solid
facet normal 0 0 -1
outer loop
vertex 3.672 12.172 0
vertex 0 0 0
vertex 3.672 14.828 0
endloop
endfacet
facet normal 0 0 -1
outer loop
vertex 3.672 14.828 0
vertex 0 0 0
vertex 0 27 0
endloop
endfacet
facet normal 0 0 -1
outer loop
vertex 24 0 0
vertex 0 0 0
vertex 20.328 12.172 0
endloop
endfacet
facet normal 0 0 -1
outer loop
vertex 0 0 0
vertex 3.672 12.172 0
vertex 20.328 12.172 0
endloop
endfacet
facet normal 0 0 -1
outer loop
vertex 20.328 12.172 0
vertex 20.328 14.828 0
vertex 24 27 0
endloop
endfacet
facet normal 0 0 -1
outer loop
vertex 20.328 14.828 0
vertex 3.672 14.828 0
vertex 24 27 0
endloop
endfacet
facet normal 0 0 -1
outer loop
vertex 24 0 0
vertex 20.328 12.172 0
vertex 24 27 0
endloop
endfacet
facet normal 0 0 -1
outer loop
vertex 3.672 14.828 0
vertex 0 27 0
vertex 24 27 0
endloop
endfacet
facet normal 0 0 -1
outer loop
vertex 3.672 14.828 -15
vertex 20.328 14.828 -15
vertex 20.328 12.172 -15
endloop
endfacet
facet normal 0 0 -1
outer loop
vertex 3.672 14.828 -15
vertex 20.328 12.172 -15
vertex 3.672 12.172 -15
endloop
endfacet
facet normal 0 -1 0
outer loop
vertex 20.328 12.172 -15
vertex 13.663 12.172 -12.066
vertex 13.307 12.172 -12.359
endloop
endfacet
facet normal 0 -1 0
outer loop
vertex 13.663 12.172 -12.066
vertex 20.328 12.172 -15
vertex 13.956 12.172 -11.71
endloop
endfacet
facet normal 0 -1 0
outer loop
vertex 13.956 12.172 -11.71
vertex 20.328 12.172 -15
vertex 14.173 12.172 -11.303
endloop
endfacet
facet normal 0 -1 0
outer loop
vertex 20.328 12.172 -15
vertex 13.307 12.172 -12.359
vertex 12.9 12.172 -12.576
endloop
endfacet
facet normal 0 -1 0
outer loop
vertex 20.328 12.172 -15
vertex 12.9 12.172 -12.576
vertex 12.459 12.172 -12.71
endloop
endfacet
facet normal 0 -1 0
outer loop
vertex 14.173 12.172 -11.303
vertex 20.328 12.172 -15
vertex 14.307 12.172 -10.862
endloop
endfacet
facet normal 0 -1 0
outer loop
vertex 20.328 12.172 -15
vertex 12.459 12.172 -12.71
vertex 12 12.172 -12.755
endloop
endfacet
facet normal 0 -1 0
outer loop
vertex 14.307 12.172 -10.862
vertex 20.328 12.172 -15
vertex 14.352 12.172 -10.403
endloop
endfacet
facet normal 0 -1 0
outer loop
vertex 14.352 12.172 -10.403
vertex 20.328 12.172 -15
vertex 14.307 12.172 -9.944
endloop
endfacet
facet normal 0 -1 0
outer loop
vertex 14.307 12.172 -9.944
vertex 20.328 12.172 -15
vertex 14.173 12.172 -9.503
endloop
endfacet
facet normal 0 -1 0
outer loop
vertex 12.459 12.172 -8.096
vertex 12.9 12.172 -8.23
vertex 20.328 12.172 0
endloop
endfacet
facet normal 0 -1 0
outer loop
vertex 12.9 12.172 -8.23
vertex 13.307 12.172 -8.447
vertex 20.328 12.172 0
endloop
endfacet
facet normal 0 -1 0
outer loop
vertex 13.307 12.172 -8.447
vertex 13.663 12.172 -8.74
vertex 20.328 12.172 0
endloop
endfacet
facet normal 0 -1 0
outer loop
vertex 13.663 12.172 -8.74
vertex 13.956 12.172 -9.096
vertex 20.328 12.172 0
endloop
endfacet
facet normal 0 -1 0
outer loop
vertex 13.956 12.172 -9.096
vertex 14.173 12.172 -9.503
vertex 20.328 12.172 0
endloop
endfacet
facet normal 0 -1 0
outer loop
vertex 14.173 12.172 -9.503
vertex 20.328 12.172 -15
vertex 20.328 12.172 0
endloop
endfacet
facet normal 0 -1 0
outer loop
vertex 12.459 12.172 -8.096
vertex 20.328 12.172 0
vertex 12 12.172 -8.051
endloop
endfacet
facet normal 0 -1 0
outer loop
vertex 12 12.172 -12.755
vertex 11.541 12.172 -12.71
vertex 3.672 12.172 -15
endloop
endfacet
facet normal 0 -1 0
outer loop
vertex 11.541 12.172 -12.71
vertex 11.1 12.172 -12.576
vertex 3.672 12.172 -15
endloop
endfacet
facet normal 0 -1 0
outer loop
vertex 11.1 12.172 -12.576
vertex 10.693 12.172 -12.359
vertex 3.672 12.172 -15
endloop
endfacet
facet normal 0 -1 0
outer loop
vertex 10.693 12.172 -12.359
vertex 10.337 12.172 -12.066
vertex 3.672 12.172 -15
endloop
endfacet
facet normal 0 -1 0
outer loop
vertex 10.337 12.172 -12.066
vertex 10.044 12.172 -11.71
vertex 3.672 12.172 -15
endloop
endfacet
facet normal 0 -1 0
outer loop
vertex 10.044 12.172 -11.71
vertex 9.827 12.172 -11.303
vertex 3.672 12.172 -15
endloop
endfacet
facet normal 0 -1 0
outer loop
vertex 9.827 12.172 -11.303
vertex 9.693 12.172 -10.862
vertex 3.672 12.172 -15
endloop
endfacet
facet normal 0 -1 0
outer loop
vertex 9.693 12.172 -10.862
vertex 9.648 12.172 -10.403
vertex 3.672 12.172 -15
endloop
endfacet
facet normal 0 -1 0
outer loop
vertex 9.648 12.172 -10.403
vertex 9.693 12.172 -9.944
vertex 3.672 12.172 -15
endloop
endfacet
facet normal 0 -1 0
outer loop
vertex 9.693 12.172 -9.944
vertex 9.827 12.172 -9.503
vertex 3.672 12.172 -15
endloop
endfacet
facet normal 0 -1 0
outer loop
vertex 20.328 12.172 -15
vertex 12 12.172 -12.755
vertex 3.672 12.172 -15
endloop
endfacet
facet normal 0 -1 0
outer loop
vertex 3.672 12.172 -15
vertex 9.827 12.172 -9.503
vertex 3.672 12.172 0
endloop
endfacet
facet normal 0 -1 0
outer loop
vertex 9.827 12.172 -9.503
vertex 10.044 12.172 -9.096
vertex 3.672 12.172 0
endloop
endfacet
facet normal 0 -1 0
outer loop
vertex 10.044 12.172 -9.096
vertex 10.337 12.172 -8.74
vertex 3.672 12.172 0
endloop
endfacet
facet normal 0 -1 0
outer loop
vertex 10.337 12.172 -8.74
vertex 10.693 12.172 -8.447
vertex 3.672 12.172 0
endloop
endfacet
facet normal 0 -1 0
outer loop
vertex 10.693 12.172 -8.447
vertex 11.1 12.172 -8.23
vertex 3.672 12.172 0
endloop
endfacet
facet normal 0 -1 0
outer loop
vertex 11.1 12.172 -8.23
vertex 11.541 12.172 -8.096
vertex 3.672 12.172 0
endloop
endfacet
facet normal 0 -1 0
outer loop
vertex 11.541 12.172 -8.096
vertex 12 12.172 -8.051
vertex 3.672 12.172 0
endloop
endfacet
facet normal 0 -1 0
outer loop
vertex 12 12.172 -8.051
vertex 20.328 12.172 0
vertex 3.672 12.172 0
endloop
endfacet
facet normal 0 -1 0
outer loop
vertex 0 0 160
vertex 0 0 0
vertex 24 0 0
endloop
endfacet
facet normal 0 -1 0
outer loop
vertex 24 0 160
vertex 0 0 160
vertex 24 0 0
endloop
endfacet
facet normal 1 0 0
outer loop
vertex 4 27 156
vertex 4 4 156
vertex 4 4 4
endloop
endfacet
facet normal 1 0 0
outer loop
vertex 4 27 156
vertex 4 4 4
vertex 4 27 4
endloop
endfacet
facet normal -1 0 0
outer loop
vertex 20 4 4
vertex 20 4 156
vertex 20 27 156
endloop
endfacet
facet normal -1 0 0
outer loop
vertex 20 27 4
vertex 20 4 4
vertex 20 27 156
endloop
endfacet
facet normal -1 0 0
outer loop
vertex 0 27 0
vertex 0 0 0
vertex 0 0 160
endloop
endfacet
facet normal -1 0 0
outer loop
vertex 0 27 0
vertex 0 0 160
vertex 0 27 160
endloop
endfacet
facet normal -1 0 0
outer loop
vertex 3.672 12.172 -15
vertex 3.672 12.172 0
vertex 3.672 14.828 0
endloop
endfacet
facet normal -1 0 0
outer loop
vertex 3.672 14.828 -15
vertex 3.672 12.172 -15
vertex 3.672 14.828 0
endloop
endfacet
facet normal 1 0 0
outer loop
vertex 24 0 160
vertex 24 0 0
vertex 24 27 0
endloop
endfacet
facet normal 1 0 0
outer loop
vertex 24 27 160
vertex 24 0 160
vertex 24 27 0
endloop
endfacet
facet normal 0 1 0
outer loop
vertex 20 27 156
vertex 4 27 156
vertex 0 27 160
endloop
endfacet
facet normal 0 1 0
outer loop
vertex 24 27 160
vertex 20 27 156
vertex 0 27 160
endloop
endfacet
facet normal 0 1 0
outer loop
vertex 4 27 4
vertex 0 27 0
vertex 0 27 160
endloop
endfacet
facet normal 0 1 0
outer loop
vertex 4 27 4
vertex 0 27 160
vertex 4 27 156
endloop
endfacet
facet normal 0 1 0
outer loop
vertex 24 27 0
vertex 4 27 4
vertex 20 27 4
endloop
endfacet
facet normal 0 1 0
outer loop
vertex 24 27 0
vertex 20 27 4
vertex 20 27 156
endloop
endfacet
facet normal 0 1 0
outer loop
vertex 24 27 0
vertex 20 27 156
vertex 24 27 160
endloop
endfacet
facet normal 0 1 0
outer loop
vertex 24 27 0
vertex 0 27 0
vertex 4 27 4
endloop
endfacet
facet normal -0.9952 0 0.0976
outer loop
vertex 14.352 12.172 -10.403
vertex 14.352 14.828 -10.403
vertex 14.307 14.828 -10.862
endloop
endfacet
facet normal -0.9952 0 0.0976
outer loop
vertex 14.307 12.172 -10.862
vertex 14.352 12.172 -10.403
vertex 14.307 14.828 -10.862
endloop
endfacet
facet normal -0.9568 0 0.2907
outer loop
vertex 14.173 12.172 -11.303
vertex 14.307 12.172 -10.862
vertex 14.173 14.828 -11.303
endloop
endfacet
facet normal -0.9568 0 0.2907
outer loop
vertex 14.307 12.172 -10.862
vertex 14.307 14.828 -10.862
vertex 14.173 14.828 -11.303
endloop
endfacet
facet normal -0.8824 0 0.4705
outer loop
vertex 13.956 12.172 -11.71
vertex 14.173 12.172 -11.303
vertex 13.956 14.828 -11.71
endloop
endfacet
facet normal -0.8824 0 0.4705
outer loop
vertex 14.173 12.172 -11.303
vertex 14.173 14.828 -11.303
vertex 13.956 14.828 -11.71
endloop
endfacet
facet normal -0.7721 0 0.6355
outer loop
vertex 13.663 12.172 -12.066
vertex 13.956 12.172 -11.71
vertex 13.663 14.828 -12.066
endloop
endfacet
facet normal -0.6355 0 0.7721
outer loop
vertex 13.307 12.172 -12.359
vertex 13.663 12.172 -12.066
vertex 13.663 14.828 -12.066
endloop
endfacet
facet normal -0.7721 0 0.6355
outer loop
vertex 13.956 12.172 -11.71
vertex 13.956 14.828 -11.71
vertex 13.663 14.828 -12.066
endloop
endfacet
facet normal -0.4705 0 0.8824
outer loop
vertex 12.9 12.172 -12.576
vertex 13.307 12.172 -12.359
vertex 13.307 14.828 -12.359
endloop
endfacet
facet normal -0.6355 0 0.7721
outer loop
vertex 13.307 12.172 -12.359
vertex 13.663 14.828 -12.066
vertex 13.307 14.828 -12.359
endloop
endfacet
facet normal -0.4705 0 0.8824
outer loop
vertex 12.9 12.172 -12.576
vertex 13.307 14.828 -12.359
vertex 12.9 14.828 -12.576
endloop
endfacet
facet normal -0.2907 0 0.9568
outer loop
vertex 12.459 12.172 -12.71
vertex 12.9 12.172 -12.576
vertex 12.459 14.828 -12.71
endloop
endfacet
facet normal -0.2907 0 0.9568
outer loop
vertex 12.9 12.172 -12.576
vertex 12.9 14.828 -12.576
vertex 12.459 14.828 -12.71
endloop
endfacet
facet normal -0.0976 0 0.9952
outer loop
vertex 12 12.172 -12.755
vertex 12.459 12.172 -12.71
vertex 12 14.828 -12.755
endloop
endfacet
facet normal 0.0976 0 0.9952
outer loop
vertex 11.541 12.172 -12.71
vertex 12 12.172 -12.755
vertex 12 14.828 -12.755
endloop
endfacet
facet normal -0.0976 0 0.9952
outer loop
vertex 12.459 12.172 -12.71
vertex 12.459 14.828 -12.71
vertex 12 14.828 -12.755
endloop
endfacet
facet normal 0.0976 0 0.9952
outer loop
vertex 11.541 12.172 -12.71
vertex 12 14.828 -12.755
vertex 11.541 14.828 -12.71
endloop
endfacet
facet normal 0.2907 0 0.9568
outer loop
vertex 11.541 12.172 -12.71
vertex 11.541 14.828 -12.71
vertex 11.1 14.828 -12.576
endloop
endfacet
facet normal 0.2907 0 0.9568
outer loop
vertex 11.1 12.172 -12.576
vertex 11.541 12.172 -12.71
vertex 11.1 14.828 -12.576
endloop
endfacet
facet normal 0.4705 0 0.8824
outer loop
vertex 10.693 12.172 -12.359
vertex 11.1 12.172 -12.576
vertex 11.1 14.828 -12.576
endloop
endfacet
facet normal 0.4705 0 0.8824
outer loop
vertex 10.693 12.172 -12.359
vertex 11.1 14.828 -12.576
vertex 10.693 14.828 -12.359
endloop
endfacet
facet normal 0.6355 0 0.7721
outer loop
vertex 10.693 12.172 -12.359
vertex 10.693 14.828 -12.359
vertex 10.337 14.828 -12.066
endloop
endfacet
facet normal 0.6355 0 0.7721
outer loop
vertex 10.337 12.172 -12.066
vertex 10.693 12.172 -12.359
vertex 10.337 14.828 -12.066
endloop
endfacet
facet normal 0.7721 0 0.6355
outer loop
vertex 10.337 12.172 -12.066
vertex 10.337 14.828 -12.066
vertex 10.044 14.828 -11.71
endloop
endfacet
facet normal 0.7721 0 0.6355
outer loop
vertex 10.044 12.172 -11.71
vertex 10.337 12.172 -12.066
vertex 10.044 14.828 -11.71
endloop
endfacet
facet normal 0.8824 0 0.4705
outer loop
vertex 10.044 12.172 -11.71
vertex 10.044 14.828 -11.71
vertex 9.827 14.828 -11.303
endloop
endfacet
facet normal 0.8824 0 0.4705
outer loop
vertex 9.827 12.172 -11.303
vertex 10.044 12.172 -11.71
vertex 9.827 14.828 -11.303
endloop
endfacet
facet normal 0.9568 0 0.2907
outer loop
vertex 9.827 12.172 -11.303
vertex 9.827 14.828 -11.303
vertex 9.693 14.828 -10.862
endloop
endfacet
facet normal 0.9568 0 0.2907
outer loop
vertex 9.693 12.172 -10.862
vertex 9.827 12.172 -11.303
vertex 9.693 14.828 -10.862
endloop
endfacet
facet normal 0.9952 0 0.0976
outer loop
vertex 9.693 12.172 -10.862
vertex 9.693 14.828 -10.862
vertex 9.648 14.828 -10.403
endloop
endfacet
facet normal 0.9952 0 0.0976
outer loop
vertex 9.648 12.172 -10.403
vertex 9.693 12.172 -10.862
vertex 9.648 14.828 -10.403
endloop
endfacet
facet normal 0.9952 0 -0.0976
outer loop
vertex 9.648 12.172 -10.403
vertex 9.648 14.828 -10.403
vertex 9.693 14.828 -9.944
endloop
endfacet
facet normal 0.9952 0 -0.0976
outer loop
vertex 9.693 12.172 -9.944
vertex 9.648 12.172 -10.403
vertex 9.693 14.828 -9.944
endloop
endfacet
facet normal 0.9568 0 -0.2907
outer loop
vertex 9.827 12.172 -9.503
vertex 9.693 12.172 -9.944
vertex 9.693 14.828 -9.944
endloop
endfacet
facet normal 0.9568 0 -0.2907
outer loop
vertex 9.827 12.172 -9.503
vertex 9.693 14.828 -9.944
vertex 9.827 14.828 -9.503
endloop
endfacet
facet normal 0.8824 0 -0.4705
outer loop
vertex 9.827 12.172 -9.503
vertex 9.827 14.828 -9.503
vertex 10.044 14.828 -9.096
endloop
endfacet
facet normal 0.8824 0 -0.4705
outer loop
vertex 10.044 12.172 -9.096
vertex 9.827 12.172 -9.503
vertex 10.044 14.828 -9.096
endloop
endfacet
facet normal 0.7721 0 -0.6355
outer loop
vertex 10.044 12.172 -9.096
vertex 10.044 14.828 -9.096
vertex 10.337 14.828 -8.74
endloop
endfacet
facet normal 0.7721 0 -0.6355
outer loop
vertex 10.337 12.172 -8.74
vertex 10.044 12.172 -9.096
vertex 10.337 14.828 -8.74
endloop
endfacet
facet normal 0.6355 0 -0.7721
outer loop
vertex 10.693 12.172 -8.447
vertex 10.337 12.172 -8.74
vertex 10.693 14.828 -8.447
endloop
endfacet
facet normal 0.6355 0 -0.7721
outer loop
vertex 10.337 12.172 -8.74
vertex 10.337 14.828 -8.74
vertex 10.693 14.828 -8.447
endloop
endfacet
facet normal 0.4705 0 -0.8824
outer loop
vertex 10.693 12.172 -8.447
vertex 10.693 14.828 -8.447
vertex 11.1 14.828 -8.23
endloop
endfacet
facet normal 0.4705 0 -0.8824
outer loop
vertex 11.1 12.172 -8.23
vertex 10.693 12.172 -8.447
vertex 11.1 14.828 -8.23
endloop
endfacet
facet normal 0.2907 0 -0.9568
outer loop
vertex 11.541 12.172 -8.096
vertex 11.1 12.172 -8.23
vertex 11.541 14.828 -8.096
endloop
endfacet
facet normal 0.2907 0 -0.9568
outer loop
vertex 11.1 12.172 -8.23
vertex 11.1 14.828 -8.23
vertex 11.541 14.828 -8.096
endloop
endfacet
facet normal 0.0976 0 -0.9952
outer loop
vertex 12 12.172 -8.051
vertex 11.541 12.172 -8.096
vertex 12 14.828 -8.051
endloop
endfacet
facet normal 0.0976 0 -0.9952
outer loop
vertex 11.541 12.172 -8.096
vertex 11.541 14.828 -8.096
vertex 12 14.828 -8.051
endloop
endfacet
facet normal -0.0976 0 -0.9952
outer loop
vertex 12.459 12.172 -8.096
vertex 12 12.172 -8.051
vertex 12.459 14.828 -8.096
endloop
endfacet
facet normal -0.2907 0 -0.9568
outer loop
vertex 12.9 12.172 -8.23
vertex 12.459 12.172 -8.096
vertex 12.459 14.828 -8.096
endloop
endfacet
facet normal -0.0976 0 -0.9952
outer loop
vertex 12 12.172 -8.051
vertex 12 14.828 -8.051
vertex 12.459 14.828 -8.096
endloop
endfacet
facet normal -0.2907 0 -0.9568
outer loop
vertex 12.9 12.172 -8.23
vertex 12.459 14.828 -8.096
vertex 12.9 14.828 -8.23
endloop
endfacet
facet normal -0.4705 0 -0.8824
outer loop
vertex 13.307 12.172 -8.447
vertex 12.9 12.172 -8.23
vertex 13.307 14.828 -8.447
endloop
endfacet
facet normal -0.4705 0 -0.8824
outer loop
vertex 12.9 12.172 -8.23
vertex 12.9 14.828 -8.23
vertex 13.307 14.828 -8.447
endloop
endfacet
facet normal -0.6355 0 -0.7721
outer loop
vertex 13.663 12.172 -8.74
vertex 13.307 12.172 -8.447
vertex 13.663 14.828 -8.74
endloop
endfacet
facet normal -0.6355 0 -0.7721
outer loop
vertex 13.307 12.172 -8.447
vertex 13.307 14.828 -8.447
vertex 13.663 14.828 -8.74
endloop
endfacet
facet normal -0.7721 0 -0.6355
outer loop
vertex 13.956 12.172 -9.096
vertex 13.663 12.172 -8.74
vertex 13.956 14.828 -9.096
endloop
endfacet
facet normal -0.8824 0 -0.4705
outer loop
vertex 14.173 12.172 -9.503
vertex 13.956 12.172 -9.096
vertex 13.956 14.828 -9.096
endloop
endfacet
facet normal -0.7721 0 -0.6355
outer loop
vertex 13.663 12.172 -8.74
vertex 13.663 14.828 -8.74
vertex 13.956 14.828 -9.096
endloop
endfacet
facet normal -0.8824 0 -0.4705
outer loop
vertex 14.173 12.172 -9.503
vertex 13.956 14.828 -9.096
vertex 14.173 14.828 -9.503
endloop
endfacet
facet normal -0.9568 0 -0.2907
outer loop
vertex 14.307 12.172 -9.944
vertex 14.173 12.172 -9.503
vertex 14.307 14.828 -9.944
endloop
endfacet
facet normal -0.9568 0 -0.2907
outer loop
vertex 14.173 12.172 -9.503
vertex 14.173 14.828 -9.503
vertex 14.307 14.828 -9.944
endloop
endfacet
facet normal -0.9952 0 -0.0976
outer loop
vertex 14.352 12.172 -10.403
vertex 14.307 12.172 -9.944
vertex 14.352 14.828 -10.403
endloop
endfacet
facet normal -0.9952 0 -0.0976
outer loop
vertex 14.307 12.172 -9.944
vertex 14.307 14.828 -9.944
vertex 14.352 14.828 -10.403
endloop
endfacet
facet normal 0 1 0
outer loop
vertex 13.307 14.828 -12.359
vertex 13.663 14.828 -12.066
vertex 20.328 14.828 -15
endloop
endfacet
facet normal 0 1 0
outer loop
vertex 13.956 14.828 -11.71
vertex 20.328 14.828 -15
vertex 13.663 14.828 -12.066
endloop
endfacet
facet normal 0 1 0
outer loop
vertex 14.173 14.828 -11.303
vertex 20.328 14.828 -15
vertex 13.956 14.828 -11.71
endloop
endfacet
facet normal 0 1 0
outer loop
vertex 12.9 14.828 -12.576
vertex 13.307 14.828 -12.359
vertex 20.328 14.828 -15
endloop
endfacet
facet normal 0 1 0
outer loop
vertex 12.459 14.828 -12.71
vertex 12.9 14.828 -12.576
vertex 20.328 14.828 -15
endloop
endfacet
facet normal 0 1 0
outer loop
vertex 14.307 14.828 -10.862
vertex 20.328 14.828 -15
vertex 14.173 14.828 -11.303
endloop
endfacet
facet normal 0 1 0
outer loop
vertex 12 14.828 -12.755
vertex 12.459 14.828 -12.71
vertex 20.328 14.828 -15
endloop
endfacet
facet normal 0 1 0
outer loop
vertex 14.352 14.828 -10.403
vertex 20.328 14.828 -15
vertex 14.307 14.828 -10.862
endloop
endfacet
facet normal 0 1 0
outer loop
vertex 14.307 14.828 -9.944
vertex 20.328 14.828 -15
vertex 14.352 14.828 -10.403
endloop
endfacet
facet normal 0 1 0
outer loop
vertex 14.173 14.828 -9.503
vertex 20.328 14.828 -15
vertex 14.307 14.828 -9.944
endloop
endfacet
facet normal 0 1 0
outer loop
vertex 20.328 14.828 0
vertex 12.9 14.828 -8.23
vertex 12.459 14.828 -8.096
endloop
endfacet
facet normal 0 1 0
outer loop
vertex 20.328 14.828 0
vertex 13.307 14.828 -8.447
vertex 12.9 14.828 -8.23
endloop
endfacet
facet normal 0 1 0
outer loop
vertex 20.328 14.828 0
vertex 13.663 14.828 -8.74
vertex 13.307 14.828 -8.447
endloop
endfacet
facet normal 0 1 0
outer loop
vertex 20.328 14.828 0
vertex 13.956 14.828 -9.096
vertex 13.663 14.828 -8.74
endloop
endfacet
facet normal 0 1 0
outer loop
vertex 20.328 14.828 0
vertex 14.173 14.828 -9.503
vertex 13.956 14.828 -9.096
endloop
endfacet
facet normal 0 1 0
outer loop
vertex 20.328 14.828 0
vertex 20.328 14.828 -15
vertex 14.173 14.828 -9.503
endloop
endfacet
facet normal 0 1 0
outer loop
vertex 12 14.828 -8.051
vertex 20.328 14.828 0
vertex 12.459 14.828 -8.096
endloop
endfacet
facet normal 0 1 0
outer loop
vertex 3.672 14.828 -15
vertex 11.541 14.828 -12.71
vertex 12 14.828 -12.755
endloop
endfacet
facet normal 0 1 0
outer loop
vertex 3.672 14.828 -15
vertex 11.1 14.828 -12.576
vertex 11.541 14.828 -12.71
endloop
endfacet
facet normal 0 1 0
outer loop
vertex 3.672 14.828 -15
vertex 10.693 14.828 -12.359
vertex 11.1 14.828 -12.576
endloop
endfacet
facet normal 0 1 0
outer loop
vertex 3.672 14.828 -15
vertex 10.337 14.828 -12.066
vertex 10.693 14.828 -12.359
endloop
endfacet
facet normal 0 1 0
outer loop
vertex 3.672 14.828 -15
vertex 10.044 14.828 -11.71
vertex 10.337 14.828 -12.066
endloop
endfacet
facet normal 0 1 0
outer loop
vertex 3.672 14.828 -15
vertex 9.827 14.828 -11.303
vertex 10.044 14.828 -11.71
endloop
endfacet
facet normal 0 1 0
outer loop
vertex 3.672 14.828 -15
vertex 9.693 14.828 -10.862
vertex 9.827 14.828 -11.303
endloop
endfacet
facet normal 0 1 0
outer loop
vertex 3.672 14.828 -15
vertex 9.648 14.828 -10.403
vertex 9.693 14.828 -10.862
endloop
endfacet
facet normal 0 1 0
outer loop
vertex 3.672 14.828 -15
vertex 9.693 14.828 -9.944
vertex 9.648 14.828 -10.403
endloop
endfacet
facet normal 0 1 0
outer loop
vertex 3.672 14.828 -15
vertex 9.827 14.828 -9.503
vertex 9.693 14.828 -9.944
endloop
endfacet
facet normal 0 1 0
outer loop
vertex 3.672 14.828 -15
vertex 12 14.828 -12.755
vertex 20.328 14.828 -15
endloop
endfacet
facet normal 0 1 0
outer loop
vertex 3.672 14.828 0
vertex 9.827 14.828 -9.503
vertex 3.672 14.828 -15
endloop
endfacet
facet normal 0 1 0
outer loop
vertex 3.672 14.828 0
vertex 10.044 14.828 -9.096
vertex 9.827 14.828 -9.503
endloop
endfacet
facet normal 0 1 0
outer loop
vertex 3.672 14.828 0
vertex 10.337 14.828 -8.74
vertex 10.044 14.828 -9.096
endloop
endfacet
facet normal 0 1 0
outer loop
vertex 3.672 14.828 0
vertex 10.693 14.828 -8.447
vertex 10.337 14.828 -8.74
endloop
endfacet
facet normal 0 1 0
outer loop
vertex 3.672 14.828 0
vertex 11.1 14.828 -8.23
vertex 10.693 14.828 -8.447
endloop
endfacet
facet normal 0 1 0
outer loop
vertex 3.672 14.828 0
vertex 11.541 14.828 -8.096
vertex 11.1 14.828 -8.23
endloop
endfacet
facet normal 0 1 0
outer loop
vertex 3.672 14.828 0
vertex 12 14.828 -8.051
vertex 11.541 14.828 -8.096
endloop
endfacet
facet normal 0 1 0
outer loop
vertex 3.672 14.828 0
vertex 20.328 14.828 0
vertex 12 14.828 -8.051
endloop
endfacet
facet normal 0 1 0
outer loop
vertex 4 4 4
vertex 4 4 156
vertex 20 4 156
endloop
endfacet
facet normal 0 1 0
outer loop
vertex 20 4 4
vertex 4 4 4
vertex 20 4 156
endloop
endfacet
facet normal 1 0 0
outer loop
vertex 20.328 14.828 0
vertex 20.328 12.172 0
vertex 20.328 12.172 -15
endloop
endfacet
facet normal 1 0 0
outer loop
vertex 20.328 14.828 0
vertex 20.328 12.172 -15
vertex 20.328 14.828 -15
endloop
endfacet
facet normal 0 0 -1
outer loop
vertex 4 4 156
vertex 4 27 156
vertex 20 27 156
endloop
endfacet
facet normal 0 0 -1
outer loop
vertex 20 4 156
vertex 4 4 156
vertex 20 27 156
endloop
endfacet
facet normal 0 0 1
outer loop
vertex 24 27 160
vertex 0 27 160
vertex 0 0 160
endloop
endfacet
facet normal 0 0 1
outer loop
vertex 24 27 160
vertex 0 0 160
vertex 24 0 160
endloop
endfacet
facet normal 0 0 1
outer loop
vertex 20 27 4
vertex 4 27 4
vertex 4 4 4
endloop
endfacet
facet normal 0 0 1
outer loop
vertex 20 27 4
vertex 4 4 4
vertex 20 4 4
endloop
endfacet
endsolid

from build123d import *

# Parameters (mm, degrees)
SKETCH1_W           = 24
SKETCH1_H           = 27
BOSS_EXTRUDE1_DEPTH = 160
SHELL1_T            = -4
SKETCH2_W           = 16.655936622
SKETCH2_H           = 2.65564638
BOSS_EXTRUDE2_DEPTH = 15
SKETCH3_R           = 2.351991257
CUT_EXTRUDE1_DEPTH  = 15.82782319


with BuildPart() as part:
    # Sketch1 → Boss-Extrude1 (new body)
    with BuildSketch(Plane.XY):
        with Locations((12, 13.5)):
            Rectangle(SKETCH1_W, SKETCH1_H)
    extrude(amount=BOSS_EXTRUDE1_DEPTH)

    # Shell1
    shell1_openings = [part.faces().sort_by_distance(p)[0] for p in [
        (12, 27, 80),
    ]]
    offset(amount=SHELL1_T, openings=shell1_openings, kind=Kind.INTERSECTION)

    # Sketch2 → Boss-Extrude2 (add)
    with BuildSketch(Plane(origin=(0, 0, 0), x_dir=(-1, 0, 0), z_dir=(0, 0, -1))):
        with Locations((-12, 13.5)):
            Rectangle(SKETCH2_W, SKETCH2_H)
    extrude(amount=BOSS_EXTRUDE2_DEPTH)

    # Sketch3 → Cut-Extrude1 (cut, through all)
    with BuildSketch(Plane(origin=(0, 14.82782319, 0), x_dir=(1, 0, 0), z_dir=(0, 1, 0))):
        with Locations((12, 10.403093439)):
            Circle(SKETCH3_R)
    extrude(amount=-CUT_EXTRUDE1_DEPTH, mode=Mode.SUBTRACT)


solid = part.part
